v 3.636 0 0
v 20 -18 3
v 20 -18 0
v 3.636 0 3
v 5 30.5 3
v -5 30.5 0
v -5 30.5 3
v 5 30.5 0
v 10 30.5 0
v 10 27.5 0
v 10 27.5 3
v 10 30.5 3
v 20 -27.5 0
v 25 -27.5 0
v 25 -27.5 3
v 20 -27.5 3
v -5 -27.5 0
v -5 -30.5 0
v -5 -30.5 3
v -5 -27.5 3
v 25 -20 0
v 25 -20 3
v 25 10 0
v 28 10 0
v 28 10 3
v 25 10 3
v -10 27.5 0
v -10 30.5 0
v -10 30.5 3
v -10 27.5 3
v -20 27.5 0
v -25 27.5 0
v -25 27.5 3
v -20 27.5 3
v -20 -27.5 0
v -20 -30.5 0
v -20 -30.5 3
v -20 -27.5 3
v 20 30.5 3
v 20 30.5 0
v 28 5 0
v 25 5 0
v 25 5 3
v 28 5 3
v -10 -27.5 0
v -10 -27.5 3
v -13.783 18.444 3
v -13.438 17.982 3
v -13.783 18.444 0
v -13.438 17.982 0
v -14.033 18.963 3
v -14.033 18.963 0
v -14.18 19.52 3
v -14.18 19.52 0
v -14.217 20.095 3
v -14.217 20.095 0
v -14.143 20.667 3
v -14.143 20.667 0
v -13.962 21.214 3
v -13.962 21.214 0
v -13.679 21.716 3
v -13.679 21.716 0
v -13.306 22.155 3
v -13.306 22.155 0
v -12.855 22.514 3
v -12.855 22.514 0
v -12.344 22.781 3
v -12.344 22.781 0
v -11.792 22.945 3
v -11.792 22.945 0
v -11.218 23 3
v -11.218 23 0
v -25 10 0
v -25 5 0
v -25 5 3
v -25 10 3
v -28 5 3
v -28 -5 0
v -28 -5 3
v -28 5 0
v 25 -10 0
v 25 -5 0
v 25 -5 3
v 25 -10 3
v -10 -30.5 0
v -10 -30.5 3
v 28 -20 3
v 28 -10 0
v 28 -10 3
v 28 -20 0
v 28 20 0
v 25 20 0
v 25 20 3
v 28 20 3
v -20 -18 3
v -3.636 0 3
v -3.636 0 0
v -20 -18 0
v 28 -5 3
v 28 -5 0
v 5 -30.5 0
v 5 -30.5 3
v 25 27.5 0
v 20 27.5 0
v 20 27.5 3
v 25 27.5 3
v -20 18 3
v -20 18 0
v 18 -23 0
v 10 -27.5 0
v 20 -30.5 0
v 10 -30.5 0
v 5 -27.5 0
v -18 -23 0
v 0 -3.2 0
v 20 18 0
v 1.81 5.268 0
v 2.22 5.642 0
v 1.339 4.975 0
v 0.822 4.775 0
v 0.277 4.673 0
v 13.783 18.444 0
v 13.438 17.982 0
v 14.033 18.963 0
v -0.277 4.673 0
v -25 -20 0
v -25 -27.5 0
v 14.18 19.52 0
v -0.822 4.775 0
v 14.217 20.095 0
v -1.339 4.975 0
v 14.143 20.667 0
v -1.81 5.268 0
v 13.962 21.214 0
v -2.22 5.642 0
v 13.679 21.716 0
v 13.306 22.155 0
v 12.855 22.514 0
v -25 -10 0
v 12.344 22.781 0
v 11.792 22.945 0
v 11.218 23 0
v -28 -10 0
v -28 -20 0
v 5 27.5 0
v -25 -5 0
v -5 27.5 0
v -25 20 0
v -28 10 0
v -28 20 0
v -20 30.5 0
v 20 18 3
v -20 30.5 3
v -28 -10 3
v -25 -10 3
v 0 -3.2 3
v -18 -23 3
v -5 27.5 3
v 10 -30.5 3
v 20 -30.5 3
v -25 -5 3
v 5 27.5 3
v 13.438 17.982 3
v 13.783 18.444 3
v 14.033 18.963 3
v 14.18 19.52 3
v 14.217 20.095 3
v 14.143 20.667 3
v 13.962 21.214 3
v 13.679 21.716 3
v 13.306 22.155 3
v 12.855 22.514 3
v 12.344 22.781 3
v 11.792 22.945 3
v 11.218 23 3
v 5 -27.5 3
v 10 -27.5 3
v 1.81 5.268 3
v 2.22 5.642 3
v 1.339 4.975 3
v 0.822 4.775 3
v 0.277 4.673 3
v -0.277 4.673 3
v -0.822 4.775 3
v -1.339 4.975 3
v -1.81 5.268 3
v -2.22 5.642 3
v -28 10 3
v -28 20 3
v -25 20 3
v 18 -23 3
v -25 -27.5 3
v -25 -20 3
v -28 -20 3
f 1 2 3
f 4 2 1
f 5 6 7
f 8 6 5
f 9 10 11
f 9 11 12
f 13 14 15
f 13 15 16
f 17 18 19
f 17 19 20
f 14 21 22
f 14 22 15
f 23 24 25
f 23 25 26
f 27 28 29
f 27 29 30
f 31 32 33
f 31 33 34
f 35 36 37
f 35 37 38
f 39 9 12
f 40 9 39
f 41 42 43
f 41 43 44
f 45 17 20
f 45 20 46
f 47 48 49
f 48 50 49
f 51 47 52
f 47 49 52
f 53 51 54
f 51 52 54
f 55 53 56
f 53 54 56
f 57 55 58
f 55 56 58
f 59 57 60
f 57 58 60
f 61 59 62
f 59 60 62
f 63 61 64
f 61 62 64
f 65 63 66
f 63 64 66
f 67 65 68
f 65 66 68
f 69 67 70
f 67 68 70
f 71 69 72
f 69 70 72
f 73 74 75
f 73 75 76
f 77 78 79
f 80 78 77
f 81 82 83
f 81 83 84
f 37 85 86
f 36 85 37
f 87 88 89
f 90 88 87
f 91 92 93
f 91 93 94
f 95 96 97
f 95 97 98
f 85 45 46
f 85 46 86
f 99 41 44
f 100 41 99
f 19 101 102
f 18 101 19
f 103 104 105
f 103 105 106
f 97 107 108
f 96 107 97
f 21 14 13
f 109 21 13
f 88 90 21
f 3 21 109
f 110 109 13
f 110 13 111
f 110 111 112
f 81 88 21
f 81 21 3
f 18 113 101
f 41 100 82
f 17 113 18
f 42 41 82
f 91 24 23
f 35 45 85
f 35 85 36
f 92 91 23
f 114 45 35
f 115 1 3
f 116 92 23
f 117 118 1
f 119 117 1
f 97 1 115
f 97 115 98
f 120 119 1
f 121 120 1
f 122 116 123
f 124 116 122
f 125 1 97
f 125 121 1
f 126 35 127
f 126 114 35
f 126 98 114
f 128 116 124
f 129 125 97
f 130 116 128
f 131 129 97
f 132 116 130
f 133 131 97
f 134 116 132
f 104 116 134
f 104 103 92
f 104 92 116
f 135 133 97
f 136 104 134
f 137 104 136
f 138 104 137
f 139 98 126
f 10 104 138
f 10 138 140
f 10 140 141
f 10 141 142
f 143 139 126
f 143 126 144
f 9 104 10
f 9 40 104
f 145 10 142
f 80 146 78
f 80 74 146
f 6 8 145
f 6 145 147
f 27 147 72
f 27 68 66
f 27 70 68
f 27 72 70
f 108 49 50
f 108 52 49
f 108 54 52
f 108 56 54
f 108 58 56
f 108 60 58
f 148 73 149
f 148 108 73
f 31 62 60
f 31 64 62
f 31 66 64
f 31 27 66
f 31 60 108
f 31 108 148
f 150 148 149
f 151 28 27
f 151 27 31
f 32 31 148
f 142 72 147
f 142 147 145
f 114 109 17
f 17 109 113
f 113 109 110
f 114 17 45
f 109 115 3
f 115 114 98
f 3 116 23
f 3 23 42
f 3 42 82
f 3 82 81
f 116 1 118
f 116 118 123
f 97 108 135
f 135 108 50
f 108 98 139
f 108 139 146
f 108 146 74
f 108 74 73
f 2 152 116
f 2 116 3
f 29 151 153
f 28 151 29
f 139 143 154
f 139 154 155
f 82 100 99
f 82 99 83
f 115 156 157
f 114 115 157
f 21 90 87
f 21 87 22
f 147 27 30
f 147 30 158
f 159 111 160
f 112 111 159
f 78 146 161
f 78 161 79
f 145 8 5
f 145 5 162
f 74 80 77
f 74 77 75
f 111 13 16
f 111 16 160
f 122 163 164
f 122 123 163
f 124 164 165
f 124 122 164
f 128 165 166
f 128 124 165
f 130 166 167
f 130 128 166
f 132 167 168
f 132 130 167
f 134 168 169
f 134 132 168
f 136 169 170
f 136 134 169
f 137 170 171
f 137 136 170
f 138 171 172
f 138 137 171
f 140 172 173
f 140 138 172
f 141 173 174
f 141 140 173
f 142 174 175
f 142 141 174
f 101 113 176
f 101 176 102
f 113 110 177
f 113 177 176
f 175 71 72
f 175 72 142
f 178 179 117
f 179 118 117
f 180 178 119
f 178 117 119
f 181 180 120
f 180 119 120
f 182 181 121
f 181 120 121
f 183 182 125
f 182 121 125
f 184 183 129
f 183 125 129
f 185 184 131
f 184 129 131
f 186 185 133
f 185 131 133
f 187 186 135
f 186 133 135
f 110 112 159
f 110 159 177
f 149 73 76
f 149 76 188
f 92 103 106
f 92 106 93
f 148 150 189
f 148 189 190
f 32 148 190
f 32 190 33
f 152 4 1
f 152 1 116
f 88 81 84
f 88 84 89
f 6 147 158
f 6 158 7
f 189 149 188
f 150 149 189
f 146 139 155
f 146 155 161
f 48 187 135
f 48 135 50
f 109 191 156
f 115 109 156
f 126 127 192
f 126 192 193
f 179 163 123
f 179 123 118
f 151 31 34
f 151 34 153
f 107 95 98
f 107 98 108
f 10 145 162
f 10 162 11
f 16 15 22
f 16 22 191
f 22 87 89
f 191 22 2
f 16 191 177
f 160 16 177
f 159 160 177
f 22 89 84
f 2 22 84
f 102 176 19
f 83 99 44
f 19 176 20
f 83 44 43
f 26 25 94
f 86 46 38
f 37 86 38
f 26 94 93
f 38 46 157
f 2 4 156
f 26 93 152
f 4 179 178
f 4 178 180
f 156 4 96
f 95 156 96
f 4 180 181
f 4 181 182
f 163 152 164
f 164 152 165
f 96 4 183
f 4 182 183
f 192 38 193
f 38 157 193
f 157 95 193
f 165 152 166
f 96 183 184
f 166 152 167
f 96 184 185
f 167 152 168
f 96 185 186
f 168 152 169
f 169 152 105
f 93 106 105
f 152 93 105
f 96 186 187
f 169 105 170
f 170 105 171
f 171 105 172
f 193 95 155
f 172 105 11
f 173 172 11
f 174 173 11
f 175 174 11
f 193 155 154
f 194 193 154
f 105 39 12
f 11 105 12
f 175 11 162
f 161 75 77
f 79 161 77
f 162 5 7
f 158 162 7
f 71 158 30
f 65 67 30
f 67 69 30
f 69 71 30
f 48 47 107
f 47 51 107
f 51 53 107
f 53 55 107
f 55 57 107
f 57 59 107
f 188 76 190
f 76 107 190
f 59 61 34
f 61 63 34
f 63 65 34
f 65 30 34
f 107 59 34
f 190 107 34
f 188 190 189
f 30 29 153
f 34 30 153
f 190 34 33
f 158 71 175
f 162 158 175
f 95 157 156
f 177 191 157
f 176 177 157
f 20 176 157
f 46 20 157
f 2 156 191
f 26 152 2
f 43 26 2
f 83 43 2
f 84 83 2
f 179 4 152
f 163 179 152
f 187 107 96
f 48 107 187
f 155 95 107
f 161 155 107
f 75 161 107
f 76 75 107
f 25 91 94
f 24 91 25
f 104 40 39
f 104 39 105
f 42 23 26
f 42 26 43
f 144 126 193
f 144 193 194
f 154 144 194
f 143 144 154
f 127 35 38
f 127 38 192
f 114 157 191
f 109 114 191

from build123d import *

# Parameters (mm, degrees)
EXTRUDE_1_DEPTH     = 3
CUT_EXTRUDE_1_DEPTH = 10
FILLET_2_R          = 3


with BuildPart() as part:
    # 草图1 → 凸台-拉伸1 (new body)
    with BuildSketch(Plane.XY):
        Polygon((-25, 27.5), (-20, 27.5), (-20, 30.5), (-10, 30.5), (-10, 27.5), (-5, 27.5), (-5, 30.5), (5, 30.5), (5, 27.5), (10, 27.5), (10, 30.5), (20, 30.5), (20, 27.5), (25, 27.5), (25, 20), (28, 20), (28, 10), (25, 10), (25, 5), (28, 5), (28, -5), (25, -5), (25, -10), (28, -10), (28, -20), (25, -20), (25, -27.5), (20, -27.5), (20, -30.5), (10, -30.5), (10, -27.5), (5, -27.5), (5, -30.5), (-5, -30.5), (-5, -27.5), (-10, -27.5), (-10, -30.5), (-20, -30.5), (-20, -27.5), (-25, -27.5), (-25, -20), (-28, -20), (-28, -10), (-25, -10), (-25, -5), (-28, -5), (-28, 5), (-25, 5), (-25, 10), (-28, 10), (-28, 20), (-25, 20), align=None)
    extrude(amount=EXTRUDE_1_DEPTH)

    # 草图2 → 切除-拉伸1 (cut)
    with BuildSketch(Plane.XY.offset(3)):
        Polygon((-18, 23), (18, 23), (0, 3.2), align=None)
        Polygon((-18, -23), (18, -23), (0, -3.2), align=None)
        Polygon((20, 18), (20, -18), (3.636363636, 0), align=None)
        Polygon((-20, 18), (-3.636363636, 0), (-20, -18), align=None)
    extrude(amount=-CUT_EXTRUDE_1_DEPTH, mode=Mode.SUBTRACT)

    # 圆角2
    fillet_2_edges = [part.edges().sort_by_distance(p)[0] for p in [
        (18, 23, 1.5),
        (0, 3.2, 1.5),
        (-18, 23, 1.5),
    ]]
    fillet(fillet_2_edges, radius=FILLET_2_R)


solid = part.part
